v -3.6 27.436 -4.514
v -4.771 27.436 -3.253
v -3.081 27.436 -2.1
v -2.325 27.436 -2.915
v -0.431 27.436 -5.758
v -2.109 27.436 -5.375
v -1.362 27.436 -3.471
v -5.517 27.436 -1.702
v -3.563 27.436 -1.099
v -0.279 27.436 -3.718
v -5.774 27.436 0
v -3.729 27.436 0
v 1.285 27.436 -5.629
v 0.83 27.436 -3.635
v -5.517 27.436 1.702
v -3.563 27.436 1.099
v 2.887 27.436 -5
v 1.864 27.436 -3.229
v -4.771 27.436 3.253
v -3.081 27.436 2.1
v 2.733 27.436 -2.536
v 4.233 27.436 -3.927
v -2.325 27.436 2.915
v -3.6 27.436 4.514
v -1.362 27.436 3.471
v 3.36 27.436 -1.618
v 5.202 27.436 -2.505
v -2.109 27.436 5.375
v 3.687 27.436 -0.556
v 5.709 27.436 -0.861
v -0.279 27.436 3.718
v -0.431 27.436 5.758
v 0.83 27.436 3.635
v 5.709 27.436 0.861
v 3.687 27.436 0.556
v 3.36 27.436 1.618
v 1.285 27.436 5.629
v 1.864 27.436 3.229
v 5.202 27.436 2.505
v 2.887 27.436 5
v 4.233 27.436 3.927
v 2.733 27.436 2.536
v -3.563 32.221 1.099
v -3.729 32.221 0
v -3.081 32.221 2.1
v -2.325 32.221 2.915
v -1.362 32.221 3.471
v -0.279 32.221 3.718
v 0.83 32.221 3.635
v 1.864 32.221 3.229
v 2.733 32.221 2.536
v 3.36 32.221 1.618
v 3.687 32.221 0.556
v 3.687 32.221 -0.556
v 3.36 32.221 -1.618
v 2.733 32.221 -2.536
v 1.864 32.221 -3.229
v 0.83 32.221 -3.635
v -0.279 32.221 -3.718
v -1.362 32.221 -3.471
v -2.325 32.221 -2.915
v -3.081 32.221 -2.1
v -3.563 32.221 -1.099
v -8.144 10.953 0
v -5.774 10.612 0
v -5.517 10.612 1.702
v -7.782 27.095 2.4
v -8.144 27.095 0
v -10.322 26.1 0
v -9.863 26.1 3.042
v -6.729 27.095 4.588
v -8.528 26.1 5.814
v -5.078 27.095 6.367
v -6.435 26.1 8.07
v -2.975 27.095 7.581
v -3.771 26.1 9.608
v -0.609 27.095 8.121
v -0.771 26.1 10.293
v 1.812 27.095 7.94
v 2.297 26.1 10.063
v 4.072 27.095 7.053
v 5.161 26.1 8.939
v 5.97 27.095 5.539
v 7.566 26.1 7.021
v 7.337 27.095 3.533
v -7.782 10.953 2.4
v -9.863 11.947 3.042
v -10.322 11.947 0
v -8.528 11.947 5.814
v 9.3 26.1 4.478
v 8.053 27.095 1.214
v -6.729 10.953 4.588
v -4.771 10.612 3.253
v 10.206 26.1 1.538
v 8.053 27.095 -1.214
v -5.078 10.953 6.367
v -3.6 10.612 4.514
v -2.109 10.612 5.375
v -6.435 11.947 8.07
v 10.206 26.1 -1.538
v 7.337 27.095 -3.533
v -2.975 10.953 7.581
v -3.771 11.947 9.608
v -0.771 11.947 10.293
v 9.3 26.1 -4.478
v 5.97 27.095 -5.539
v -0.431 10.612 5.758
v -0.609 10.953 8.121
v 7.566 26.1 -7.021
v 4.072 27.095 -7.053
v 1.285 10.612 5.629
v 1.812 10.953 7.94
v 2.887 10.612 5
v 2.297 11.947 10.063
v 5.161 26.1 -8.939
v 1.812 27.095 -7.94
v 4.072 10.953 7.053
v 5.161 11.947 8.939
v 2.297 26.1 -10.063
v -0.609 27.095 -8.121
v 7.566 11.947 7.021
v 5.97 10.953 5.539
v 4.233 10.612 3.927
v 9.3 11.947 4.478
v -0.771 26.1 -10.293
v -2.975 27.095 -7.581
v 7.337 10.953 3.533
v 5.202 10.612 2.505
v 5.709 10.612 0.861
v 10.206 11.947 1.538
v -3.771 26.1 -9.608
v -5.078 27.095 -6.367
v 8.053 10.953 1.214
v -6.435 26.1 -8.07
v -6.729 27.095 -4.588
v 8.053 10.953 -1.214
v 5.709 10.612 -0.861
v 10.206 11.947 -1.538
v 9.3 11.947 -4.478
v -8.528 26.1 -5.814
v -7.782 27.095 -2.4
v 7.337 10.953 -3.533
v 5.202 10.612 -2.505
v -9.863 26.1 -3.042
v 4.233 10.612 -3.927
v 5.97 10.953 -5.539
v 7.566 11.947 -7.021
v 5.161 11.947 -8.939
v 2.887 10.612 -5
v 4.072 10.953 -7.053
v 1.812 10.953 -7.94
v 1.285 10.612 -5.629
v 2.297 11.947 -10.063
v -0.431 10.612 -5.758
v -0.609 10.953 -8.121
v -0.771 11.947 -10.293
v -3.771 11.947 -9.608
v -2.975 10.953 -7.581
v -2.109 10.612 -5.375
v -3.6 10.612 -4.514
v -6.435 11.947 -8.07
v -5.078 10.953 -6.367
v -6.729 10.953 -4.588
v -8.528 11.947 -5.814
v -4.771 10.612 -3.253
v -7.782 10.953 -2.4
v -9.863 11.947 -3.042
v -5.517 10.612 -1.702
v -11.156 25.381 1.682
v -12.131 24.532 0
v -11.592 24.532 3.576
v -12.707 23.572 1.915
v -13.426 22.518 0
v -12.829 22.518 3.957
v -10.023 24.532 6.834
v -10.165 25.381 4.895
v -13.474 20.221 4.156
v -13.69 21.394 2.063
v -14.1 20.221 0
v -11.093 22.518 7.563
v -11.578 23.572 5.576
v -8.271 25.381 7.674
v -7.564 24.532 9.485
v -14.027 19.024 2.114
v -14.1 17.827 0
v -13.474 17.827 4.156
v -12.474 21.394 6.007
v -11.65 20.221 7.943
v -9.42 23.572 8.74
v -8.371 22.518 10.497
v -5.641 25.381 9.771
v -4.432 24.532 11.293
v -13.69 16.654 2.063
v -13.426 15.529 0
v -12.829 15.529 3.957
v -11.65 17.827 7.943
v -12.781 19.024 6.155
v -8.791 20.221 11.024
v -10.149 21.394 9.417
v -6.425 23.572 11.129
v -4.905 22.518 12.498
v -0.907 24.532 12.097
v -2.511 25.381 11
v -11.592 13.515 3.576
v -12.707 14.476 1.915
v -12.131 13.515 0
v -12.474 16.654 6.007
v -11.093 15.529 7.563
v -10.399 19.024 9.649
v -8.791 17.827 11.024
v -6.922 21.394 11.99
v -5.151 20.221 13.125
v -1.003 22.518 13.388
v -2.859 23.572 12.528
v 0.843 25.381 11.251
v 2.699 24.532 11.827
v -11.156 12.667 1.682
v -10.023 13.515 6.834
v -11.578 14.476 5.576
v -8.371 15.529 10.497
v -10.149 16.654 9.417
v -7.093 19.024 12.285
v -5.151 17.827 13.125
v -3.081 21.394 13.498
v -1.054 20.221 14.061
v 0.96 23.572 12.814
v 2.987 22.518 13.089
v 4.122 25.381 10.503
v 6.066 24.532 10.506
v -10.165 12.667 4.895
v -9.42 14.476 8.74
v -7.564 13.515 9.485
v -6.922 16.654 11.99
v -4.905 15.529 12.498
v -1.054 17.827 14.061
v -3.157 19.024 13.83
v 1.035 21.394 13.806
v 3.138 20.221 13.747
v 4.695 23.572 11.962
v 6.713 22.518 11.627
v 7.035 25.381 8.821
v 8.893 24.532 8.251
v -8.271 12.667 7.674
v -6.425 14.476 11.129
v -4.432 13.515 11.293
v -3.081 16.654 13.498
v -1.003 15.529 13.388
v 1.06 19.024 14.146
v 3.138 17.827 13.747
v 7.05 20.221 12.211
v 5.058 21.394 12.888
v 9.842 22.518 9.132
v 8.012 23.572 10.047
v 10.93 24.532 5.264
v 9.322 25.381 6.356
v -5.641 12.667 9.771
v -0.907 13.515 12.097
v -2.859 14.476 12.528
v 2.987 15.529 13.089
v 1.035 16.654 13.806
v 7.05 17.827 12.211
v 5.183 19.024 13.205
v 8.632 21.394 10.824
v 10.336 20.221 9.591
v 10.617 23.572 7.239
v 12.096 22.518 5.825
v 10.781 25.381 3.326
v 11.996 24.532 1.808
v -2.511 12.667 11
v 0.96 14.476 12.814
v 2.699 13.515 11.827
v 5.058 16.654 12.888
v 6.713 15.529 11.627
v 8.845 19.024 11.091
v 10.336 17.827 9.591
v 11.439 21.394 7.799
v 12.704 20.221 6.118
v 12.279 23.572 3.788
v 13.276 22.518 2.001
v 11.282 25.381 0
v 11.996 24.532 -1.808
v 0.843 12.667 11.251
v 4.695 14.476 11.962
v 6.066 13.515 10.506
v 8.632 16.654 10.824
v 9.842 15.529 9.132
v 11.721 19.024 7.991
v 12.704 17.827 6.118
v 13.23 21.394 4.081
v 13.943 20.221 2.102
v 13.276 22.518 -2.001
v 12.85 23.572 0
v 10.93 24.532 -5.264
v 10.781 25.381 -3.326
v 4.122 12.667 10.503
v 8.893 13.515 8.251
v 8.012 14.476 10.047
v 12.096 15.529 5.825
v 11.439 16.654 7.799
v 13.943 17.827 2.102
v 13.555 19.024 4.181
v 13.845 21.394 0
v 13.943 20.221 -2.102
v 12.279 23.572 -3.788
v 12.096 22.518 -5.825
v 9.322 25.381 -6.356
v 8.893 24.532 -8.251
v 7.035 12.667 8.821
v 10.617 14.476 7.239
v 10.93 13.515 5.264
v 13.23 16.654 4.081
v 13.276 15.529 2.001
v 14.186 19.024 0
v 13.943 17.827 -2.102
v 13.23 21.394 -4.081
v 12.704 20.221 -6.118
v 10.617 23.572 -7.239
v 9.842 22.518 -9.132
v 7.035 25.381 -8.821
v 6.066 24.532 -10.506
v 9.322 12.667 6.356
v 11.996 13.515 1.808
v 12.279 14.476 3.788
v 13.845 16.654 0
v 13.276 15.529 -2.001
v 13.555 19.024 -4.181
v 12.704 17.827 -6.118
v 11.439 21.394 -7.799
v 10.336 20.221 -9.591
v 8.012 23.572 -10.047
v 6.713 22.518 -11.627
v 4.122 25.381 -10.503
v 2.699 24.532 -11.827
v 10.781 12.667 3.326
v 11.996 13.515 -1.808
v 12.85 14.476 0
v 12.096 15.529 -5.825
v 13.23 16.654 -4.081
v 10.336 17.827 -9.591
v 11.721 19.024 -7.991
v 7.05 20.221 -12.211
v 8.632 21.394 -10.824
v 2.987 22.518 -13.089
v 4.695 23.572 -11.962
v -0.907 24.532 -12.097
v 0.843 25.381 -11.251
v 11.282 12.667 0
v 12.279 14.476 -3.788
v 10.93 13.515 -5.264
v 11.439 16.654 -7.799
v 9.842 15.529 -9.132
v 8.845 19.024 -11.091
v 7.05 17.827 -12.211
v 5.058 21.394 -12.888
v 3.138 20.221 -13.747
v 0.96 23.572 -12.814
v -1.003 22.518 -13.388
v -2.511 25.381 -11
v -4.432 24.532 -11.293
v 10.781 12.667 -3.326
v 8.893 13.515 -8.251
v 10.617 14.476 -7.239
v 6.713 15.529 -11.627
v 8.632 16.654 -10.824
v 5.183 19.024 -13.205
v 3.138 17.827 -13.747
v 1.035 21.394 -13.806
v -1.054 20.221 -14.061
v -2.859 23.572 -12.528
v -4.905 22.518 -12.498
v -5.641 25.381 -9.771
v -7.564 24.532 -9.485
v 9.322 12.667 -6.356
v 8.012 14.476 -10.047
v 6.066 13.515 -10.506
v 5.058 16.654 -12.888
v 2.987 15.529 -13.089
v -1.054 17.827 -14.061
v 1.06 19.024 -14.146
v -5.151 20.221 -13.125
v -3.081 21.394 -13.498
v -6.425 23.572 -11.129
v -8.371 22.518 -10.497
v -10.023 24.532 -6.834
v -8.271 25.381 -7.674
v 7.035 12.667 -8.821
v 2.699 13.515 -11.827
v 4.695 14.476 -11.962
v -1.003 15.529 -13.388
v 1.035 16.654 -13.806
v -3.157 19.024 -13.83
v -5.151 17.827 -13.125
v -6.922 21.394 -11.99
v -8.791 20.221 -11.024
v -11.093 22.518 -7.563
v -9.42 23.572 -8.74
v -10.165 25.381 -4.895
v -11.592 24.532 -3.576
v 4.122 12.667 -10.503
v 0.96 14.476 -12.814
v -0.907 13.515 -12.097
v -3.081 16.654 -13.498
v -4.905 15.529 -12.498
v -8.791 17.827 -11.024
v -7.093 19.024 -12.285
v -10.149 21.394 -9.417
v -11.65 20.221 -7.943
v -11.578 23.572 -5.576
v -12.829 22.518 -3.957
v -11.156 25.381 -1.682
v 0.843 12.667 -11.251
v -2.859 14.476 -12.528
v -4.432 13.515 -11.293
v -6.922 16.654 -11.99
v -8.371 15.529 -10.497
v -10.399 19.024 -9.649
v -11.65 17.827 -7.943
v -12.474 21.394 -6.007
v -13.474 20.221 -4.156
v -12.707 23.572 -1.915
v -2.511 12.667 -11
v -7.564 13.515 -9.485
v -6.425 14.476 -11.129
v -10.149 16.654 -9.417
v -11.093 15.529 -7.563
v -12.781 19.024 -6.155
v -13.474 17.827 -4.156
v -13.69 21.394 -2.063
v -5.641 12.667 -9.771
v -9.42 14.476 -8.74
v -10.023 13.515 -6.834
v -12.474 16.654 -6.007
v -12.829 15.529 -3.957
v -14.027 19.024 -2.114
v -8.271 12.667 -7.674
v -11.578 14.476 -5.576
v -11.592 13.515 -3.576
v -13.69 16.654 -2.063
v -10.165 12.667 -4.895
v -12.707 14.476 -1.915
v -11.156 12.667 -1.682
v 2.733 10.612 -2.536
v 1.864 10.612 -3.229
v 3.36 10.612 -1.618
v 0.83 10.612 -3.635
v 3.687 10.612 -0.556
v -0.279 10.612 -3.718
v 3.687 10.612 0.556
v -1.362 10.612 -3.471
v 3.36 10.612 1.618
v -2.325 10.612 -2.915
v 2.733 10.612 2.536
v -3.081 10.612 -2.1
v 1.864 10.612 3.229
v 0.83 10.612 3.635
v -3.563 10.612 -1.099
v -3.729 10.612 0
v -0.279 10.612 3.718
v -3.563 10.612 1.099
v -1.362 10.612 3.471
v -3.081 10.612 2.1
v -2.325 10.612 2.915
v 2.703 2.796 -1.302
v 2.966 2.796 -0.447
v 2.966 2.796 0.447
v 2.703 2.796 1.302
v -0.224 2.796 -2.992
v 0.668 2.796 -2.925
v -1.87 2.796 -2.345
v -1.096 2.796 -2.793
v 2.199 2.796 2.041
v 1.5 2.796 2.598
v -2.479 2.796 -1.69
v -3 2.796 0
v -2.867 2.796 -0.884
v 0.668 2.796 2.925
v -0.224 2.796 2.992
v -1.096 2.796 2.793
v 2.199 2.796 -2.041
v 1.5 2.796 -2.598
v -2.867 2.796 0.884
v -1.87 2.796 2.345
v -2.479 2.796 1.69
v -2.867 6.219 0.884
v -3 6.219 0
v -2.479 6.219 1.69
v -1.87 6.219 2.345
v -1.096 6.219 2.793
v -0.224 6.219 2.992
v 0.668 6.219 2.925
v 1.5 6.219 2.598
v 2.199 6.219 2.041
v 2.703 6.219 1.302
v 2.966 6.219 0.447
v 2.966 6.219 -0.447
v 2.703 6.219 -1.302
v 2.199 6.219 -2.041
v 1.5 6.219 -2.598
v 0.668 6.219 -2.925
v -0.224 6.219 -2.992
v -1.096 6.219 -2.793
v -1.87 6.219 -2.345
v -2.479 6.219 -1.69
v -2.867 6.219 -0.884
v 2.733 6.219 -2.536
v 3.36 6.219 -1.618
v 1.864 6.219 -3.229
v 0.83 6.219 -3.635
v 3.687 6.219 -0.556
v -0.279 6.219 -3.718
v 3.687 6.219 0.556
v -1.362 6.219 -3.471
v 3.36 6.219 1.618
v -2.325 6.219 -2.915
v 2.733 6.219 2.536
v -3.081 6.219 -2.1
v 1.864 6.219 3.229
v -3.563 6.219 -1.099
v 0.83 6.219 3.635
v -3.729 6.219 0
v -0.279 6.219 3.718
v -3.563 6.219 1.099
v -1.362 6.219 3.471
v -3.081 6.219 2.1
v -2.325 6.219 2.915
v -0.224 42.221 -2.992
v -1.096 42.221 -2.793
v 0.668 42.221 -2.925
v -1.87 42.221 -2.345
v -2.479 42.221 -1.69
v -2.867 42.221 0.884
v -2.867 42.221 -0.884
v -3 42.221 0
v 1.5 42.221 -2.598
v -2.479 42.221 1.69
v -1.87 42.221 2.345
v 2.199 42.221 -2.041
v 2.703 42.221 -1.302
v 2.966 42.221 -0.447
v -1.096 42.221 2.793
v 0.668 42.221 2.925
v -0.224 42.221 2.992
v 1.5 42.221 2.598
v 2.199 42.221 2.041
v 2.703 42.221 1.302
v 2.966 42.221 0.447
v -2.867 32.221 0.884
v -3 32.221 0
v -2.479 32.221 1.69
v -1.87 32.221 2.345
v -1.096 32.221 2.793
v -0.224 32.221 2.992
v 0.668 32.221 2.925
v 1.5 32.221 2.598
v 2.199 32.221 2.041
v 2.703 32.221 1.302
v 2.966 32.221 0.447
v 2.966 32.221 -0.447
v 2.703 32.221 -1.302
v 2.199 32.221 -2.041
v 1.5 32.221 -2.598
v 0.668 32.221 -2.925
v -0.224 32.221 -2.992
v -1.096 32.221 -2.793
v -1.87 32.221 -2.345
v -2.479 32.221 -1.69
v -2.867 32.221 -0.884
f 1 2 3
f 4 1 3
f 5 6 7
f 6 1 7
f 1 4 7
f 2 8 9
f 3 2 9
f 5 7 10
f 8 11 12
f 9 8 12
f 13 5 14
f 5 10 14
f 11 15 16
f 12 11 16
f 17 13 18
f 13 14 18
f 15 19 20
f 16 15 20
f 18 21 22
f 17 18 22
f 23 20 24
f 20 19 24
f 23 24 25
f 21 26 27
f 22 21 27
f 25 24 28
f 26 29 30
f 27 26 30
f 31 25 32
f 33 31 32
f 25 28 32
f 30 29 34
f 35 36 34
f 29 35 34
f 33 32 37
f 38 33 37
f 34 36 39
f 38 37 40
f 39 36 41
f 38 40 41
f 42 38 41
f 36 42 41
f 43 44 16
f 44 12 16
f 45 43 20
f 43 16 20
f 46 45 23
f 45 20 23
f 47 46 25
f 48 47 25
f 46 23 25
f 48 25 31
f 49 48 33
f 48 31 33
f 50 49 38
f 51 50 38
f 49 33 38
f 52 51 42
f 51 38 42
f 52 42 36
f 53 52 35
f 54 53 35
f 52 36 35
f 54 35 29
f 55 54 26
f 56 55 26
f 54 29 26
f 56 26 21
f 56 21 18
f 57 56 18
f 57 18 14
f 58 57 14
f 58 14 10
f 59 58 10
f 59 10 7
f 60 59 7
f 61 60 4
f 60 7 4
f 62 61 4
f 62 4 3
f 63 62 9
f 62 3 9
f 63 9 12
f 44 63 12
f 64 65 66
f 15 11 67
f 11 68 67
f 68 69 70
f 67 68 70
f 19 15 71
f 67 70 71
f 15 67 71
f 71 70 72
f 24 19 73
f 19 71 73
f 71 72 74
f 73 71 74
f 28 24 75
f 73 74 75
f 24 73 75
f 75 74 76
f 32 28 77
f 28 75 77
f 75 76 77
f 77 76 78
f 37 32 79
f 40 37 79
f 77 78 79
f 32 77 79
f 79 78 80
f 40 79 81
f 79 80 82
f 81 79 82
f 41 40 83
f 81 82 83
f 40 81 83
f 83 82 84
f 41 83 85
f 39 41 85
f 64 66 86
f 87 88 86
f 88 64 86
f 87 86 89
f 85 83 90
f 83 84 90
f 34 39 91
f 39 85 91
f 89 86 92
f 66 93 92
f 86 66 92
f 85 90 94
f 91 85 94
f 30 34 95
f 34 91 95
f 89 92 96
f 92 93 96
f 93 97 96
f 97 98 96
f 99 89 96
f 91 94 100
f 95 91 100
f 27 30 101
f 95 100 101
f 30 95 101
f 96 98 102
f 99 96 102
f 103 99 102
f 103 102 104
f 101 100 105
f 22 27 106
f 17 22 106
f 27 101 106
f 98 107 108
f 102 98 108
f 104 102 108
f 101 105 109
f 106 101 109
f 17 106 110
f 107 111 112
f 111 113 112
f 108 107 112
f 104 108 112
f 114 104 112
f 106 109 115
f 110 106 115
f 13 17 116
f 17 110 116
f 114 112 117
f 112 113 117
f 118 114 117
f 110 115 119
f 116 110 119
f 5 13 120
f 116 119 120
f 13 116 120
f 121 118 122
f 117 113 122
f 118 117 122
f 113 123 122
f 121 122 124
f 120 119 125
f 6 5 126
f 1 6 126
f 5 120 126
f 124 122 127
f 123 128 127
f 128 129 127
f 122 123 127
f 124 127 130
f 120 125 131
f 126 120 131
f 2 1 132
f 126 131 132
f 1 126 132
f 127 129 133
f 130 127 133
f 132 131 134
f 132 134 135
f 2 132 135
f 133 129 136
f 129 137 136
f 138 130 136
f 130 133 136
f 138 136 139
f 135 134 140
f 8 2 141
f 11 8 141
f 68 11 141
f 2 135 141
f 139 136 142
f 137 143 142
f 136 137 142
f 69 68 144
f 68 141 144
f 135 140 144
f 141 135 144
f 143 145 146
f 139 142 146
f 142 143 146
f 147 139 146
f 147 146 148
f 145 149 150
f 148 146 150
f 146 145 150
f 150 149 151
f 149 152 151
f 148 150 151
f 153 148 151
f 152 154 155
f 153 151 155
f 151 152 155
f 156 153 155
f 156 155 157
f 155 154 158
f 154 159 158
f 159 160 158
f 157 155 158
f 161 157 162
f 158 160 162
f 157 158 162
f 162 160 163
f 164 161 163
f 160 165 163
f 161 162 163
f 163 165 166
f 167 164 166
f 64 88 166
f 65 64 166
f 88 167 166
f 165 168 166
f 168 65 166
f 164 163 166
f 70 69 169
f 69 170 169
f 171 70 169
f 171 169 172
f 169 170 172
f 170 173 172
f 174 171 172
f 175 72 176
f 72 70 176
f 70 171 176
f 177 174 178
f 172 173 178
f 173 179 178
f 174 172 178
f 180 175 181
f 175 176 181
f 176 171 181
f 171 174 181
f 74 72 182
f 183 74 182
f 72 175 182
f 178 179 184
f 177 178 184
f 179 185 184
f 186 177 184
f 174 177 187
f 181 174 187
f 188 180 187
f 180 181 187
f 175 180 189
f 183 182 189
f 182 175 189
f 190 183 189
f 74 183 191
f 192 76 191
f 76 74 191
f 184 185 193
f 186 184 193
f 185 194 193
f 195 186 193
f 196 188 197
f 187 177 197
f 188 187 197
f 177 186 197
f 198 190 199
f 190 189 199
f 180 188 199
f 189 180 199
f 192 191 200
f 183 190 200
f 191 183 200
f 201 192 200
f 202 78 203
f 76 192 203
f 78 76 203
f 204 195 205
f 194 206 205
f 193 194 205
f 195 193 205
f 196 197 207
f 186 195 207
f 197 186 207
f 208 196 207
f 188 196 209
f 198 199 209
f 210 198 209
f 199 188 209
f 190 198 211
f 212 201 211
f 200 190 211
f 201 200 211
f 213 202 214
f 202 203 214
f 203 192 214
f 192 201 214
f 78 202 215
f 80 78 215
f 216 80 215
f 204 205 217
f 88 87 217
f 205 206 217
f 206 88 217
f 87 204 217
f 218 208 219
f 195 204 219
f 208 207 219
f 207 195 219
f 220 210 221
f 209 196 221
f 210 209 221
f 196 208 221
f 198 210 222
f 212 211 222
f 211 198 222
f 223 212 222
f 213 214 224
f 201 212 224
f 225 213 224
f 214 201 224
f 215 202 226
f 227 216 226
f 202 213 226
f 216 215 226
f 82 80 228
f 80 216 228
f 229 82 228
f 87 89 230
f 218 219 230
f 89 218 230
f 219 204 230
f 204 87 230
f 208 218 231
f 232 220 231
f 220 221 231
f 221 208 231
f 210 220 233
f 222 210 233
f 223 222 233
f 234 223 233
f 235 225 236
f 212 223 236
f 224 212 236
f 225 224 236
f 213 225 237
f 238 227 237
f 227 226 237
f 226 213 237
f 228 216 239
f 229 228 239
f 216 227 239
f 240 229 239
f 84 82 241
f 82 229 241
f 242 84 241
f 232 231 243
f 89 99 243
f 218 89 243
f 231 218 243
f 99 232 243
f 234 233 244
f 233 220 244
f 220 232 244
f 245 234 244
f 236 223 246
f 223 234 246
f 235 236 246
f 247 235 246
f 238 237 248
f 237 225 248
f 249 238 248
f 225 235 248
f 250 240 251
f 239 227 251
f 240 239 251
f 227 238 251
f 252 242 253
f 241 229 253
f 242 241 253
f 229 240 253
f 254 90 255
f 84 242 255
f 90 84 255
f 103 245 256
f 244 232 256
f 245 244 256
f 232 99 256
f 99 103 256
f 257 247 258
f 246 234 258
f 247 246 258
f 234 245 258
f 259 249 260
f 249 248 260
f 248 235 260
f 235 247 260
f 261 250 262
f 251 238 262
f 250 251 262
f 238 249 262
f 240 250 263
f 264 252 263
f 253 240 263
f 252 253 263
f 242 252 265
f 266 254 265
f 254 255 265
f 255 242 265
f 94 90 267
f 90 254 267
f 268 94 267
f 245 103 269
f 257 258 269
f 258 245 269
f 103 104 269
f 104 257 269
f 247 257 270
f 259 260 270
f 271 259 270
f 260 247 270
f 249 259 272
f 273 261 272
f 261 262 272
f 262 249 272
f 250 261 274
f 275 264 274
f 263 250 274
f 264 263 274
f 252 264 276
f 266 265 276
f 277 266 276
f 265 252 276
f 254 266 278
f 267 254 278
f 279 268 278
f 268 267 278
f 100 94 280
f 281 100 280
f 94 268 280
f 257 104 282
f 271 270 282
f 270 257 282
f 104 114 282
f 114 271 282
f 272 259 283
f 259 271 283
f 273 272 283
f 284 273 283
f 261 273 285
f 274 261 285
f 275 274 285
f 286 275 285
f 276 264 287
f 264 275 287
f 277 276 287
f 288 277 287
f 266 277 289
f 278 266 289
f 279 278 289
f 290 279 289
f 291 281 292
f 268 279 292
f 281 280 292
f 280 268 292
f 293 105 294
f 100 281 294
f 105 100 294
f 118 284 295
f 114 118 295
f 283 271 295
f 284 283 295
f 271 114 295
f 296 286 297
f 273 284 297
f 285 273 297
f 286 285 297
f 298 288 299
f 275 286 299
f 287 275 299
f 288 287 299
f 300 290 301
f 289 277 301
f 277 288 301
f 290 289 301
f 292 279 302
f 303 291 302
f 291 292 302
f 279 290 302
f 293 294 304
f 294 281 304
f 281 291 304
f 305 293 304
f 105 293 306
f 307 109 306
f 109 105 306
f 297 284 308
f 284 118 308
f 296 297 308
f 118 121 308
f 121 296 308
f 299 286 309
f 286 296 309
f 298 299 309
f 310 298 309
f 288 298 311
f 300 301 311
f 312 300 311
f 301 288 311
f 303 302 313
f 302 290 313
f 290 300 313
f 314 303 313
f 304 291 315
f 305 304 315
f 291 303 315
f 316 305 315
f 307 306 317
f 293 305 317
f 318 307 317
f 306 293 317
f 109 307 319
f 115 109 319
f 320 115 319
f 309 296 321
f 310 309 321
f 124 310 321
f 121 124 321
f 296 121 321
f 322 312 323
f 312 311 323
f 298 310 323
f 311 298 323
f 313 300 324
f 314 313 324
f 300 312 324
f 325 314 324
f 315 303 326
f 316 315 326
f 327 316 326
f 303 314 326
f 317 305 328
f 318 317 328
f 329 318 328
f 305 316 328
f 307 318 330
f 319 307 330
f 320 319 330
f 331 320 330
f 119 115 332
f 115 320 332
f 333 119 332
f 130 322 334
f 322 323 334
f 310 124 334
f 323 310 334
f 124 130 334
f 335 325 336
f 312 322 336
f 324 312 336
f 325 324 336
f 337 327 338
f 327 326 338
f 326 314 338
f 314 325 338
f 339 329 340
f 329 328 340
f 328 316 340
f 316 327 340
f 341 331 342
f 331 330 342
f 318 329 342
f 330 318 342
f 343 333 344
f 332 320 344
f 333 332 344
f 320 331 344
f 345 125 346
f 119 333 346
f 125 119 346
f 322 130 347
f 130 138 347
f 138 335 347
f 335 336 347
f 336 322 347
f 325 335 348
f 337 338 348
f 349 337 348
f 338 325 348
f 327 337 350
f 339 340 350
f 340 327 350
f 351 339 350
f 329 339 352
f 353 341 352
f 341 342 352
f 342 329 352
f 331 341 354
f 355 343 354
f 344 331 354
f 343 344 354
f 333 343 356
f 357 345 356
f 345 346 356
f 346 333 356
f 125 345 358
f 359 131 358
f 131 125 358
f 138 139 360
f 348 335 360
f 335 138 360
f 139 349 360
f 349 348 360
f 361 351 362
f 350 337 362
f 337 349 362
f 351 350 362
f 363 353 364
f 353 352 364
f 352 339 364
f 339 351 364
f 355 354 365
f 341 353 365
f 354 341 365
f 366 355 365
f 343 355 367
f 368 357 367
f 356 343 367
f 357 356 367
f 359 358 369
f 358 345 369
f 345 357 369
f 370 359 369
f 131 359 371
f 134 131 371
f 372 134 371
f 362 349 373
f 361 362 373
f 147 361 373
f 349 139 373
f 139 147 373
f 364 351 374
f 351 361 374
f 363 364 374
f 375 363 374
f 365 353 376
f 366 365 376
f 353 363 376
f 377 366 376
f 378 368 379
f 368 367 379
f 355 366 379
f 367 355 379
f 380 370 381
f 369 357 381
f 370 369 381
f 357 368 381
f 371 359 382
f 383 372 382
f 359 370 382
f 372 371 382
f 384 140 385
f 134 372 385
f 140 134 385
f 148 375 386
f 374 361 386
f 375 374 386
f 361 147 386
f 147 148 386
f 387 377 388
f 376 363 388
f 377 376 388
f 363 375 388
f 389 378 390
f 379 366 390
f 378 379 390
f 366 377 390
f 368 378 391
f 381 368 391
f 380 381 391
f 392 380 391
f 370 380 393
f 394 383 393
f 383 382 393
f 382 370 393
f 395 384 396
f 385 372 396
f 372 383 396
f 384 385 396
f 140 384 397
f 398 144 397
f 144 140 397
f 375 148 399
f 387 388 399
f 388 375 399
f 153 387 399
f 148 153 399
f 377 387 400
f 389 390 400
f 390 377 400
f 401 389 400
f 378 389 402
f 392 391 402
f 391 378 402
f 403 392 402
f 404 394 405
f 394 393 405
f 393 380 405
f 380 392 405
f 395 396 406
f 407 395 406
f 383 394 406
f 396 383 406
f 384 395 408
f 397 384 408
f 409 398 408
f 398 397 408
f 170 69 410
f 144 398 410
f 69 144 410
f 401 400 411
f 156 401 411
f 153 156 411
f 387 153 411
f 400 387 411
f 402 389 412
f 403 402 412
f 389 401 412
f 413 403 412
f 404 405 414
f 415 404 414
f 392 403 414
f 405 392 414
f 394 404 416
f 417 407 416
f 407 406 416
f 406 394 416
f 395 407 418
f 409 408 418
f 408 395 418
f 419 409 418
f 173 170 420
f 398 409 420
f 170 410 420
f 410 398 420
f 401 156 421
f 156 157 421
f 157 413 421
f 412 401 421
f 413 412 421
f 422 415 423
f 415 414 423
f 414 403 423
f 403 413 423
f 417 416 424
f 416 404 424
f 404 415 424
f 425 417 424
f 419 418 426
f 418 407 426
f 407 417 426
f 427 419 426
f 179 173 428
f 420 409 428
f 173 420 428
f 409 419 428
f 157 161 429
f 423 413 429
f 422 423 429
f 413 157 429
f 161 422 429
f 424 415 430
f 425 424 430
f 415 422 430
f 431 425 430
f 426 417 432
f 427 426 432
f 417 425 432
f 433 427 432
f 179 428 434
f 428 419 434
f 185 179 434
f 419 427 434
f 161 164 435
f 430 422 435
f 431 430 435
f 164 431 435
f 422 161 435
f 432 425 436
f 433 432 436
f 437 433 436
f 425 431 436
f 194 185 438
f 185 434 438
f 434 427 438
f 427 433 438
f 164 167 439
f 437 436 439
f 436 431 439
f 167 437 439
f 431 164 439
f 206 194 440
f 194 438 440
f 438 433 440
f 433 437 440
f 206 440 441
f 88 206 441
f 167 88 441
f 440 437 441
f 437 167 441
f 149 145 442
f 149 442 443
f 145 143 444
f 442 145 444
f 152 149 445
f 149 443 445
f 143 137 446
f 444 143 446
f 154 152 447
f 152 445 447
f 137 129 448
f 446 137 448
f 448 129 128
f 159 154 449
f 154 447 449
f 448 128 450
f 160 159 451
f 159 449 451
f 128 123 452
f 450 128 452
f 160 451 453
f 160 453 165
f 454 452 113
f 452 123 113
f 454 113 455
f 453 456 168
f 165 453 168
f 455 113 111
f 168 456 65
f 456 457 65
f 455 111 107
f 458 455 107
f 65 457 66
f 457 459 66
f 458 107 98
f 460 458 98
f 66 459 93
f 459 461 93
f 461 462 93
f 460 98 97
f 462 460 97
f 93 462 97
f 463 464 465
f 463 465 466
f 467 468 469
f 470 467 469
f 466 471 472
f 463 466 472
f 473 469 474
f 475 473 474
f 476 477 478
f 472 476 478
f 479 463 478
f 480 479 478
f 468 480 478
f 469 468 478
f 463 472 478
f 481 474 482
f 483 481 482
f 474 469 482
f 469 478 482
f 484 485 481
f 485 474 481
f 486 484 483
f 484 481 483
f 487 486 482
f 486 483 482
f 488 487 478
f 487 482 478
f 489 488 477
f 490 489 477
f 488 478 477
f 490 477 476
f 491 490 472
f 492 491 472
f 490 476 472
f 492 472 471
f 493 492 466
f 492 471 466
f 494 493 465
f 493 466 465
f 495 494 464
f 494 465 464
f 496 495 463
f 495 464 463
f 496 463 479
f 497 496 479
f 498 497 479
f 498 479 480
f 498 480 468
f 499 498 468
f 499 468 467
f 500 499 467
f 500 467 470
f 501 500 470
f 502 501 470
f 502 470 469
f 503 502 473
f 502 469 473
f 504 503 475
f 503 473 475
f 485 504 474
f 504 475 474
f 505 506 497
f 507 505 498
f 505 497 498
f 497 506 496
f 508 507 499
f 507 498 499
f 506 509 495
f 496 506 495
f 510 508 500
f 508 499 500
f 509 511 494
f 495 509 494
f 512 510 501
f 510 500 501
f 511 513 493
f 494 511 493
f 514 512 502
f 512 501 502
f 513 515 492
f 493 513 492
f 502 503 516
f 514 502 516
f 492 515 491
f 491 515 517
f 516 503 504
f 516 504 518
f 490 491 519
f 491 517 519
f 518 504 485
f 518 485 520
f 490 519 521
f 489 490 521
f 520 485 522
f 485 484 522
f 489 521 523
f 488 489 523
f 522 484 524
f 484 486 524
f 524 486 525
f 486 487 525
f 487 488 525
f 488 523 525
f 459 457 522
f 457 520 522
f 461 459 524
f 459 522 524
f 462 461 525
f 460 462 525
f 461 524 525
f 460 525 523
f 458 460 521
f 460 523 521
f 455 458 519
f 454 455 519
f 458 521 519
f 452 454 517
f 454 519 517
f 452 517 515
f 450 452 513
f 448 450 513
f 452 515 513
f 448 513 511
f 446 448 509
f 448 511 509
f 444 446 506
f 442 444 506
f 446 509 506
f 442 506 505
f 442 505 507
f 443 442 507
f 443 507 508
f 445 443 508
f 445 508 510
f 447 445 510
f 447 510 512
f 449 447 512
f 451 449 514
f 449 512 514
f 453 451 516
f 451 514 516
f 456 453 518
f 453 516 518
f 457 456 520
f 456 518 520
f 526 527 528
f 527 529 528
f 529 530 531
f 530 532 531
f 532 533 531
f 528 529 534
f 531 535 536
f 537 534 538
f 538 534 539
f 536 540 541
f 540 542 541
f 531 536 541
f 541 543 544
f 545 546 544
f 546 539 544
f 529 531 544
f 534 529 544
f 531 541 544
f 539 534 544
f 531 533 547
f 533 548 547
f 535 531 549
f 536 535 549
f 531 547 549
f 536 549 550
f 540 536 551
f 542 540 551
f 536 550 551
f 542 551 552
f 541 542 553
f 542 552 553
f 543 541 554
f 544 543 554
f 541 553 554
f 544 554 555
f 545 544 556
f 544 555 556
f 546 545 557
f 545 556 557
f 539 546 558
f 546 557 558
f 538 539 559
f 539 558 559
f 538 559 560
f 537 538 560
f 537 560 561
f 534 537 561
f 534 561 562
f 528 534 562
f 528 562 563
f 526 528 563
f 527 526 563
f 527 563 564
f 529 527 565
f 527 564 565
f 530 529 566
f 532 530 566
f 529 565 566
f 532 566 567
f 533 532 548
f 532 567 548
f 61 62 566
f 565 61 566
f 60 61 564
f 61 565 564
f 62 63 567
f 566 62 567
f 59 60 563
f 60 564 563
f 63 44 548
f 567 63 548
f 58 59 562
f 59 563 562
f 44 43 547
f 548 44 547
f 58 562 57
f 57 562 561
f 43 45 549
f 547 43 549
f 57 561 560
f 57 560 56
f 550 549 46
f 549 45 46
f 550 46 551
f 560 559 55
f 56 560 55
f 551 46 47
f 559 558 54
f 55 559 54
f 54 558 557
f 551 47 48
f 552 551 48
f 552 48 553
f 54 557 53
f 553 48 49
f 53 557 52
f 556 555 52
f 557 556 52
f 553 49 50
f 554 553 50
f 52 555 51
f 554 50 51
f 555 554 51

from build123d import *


with BuildPart() as part:
    # Эскиз1 → Повернуть1 (revolve)
    with BuildSketch(Plane.XY):
        with BuildLine():
            Line((0, 42.221330192), (-3, 42.221330192))
            Line((-3, 42.221330192), (-3, 32.221330192))
            Line((-3, 32.221330192), (-3.728781423, 32.221330192))
            Line((-3.728781423, 32.221330192), (-3.728781423, 27.435605162))
            Line((-3.728781423, 27.435605162), (-5.773927938, 27.435605162))
            ThreePointArc((-5.773927938, 27.435605162), (-14.185723229, 19.023809872), (-5.773927938, 10.612014581))
            Line((-5.773927938, 10.612014581), (-3.728781423, 10.612014581))
            Line((-3.728781423, 10.612014581), (-3.728781423, 6.218549743))
            Line((-3.728781423, 6.218549743), (-3, 6.218549743))
            Line((-3, 6.218549743), (-3, 2.795657314))
            Line((-3, 2.795657314), (0, 2.795657314))
            Line((0, 2.795657314), (0, 42.221330192))
        make_face()
    revolve(axis=Axis((0, 0, 0), (0, 1, 0)))


solid = part.part
